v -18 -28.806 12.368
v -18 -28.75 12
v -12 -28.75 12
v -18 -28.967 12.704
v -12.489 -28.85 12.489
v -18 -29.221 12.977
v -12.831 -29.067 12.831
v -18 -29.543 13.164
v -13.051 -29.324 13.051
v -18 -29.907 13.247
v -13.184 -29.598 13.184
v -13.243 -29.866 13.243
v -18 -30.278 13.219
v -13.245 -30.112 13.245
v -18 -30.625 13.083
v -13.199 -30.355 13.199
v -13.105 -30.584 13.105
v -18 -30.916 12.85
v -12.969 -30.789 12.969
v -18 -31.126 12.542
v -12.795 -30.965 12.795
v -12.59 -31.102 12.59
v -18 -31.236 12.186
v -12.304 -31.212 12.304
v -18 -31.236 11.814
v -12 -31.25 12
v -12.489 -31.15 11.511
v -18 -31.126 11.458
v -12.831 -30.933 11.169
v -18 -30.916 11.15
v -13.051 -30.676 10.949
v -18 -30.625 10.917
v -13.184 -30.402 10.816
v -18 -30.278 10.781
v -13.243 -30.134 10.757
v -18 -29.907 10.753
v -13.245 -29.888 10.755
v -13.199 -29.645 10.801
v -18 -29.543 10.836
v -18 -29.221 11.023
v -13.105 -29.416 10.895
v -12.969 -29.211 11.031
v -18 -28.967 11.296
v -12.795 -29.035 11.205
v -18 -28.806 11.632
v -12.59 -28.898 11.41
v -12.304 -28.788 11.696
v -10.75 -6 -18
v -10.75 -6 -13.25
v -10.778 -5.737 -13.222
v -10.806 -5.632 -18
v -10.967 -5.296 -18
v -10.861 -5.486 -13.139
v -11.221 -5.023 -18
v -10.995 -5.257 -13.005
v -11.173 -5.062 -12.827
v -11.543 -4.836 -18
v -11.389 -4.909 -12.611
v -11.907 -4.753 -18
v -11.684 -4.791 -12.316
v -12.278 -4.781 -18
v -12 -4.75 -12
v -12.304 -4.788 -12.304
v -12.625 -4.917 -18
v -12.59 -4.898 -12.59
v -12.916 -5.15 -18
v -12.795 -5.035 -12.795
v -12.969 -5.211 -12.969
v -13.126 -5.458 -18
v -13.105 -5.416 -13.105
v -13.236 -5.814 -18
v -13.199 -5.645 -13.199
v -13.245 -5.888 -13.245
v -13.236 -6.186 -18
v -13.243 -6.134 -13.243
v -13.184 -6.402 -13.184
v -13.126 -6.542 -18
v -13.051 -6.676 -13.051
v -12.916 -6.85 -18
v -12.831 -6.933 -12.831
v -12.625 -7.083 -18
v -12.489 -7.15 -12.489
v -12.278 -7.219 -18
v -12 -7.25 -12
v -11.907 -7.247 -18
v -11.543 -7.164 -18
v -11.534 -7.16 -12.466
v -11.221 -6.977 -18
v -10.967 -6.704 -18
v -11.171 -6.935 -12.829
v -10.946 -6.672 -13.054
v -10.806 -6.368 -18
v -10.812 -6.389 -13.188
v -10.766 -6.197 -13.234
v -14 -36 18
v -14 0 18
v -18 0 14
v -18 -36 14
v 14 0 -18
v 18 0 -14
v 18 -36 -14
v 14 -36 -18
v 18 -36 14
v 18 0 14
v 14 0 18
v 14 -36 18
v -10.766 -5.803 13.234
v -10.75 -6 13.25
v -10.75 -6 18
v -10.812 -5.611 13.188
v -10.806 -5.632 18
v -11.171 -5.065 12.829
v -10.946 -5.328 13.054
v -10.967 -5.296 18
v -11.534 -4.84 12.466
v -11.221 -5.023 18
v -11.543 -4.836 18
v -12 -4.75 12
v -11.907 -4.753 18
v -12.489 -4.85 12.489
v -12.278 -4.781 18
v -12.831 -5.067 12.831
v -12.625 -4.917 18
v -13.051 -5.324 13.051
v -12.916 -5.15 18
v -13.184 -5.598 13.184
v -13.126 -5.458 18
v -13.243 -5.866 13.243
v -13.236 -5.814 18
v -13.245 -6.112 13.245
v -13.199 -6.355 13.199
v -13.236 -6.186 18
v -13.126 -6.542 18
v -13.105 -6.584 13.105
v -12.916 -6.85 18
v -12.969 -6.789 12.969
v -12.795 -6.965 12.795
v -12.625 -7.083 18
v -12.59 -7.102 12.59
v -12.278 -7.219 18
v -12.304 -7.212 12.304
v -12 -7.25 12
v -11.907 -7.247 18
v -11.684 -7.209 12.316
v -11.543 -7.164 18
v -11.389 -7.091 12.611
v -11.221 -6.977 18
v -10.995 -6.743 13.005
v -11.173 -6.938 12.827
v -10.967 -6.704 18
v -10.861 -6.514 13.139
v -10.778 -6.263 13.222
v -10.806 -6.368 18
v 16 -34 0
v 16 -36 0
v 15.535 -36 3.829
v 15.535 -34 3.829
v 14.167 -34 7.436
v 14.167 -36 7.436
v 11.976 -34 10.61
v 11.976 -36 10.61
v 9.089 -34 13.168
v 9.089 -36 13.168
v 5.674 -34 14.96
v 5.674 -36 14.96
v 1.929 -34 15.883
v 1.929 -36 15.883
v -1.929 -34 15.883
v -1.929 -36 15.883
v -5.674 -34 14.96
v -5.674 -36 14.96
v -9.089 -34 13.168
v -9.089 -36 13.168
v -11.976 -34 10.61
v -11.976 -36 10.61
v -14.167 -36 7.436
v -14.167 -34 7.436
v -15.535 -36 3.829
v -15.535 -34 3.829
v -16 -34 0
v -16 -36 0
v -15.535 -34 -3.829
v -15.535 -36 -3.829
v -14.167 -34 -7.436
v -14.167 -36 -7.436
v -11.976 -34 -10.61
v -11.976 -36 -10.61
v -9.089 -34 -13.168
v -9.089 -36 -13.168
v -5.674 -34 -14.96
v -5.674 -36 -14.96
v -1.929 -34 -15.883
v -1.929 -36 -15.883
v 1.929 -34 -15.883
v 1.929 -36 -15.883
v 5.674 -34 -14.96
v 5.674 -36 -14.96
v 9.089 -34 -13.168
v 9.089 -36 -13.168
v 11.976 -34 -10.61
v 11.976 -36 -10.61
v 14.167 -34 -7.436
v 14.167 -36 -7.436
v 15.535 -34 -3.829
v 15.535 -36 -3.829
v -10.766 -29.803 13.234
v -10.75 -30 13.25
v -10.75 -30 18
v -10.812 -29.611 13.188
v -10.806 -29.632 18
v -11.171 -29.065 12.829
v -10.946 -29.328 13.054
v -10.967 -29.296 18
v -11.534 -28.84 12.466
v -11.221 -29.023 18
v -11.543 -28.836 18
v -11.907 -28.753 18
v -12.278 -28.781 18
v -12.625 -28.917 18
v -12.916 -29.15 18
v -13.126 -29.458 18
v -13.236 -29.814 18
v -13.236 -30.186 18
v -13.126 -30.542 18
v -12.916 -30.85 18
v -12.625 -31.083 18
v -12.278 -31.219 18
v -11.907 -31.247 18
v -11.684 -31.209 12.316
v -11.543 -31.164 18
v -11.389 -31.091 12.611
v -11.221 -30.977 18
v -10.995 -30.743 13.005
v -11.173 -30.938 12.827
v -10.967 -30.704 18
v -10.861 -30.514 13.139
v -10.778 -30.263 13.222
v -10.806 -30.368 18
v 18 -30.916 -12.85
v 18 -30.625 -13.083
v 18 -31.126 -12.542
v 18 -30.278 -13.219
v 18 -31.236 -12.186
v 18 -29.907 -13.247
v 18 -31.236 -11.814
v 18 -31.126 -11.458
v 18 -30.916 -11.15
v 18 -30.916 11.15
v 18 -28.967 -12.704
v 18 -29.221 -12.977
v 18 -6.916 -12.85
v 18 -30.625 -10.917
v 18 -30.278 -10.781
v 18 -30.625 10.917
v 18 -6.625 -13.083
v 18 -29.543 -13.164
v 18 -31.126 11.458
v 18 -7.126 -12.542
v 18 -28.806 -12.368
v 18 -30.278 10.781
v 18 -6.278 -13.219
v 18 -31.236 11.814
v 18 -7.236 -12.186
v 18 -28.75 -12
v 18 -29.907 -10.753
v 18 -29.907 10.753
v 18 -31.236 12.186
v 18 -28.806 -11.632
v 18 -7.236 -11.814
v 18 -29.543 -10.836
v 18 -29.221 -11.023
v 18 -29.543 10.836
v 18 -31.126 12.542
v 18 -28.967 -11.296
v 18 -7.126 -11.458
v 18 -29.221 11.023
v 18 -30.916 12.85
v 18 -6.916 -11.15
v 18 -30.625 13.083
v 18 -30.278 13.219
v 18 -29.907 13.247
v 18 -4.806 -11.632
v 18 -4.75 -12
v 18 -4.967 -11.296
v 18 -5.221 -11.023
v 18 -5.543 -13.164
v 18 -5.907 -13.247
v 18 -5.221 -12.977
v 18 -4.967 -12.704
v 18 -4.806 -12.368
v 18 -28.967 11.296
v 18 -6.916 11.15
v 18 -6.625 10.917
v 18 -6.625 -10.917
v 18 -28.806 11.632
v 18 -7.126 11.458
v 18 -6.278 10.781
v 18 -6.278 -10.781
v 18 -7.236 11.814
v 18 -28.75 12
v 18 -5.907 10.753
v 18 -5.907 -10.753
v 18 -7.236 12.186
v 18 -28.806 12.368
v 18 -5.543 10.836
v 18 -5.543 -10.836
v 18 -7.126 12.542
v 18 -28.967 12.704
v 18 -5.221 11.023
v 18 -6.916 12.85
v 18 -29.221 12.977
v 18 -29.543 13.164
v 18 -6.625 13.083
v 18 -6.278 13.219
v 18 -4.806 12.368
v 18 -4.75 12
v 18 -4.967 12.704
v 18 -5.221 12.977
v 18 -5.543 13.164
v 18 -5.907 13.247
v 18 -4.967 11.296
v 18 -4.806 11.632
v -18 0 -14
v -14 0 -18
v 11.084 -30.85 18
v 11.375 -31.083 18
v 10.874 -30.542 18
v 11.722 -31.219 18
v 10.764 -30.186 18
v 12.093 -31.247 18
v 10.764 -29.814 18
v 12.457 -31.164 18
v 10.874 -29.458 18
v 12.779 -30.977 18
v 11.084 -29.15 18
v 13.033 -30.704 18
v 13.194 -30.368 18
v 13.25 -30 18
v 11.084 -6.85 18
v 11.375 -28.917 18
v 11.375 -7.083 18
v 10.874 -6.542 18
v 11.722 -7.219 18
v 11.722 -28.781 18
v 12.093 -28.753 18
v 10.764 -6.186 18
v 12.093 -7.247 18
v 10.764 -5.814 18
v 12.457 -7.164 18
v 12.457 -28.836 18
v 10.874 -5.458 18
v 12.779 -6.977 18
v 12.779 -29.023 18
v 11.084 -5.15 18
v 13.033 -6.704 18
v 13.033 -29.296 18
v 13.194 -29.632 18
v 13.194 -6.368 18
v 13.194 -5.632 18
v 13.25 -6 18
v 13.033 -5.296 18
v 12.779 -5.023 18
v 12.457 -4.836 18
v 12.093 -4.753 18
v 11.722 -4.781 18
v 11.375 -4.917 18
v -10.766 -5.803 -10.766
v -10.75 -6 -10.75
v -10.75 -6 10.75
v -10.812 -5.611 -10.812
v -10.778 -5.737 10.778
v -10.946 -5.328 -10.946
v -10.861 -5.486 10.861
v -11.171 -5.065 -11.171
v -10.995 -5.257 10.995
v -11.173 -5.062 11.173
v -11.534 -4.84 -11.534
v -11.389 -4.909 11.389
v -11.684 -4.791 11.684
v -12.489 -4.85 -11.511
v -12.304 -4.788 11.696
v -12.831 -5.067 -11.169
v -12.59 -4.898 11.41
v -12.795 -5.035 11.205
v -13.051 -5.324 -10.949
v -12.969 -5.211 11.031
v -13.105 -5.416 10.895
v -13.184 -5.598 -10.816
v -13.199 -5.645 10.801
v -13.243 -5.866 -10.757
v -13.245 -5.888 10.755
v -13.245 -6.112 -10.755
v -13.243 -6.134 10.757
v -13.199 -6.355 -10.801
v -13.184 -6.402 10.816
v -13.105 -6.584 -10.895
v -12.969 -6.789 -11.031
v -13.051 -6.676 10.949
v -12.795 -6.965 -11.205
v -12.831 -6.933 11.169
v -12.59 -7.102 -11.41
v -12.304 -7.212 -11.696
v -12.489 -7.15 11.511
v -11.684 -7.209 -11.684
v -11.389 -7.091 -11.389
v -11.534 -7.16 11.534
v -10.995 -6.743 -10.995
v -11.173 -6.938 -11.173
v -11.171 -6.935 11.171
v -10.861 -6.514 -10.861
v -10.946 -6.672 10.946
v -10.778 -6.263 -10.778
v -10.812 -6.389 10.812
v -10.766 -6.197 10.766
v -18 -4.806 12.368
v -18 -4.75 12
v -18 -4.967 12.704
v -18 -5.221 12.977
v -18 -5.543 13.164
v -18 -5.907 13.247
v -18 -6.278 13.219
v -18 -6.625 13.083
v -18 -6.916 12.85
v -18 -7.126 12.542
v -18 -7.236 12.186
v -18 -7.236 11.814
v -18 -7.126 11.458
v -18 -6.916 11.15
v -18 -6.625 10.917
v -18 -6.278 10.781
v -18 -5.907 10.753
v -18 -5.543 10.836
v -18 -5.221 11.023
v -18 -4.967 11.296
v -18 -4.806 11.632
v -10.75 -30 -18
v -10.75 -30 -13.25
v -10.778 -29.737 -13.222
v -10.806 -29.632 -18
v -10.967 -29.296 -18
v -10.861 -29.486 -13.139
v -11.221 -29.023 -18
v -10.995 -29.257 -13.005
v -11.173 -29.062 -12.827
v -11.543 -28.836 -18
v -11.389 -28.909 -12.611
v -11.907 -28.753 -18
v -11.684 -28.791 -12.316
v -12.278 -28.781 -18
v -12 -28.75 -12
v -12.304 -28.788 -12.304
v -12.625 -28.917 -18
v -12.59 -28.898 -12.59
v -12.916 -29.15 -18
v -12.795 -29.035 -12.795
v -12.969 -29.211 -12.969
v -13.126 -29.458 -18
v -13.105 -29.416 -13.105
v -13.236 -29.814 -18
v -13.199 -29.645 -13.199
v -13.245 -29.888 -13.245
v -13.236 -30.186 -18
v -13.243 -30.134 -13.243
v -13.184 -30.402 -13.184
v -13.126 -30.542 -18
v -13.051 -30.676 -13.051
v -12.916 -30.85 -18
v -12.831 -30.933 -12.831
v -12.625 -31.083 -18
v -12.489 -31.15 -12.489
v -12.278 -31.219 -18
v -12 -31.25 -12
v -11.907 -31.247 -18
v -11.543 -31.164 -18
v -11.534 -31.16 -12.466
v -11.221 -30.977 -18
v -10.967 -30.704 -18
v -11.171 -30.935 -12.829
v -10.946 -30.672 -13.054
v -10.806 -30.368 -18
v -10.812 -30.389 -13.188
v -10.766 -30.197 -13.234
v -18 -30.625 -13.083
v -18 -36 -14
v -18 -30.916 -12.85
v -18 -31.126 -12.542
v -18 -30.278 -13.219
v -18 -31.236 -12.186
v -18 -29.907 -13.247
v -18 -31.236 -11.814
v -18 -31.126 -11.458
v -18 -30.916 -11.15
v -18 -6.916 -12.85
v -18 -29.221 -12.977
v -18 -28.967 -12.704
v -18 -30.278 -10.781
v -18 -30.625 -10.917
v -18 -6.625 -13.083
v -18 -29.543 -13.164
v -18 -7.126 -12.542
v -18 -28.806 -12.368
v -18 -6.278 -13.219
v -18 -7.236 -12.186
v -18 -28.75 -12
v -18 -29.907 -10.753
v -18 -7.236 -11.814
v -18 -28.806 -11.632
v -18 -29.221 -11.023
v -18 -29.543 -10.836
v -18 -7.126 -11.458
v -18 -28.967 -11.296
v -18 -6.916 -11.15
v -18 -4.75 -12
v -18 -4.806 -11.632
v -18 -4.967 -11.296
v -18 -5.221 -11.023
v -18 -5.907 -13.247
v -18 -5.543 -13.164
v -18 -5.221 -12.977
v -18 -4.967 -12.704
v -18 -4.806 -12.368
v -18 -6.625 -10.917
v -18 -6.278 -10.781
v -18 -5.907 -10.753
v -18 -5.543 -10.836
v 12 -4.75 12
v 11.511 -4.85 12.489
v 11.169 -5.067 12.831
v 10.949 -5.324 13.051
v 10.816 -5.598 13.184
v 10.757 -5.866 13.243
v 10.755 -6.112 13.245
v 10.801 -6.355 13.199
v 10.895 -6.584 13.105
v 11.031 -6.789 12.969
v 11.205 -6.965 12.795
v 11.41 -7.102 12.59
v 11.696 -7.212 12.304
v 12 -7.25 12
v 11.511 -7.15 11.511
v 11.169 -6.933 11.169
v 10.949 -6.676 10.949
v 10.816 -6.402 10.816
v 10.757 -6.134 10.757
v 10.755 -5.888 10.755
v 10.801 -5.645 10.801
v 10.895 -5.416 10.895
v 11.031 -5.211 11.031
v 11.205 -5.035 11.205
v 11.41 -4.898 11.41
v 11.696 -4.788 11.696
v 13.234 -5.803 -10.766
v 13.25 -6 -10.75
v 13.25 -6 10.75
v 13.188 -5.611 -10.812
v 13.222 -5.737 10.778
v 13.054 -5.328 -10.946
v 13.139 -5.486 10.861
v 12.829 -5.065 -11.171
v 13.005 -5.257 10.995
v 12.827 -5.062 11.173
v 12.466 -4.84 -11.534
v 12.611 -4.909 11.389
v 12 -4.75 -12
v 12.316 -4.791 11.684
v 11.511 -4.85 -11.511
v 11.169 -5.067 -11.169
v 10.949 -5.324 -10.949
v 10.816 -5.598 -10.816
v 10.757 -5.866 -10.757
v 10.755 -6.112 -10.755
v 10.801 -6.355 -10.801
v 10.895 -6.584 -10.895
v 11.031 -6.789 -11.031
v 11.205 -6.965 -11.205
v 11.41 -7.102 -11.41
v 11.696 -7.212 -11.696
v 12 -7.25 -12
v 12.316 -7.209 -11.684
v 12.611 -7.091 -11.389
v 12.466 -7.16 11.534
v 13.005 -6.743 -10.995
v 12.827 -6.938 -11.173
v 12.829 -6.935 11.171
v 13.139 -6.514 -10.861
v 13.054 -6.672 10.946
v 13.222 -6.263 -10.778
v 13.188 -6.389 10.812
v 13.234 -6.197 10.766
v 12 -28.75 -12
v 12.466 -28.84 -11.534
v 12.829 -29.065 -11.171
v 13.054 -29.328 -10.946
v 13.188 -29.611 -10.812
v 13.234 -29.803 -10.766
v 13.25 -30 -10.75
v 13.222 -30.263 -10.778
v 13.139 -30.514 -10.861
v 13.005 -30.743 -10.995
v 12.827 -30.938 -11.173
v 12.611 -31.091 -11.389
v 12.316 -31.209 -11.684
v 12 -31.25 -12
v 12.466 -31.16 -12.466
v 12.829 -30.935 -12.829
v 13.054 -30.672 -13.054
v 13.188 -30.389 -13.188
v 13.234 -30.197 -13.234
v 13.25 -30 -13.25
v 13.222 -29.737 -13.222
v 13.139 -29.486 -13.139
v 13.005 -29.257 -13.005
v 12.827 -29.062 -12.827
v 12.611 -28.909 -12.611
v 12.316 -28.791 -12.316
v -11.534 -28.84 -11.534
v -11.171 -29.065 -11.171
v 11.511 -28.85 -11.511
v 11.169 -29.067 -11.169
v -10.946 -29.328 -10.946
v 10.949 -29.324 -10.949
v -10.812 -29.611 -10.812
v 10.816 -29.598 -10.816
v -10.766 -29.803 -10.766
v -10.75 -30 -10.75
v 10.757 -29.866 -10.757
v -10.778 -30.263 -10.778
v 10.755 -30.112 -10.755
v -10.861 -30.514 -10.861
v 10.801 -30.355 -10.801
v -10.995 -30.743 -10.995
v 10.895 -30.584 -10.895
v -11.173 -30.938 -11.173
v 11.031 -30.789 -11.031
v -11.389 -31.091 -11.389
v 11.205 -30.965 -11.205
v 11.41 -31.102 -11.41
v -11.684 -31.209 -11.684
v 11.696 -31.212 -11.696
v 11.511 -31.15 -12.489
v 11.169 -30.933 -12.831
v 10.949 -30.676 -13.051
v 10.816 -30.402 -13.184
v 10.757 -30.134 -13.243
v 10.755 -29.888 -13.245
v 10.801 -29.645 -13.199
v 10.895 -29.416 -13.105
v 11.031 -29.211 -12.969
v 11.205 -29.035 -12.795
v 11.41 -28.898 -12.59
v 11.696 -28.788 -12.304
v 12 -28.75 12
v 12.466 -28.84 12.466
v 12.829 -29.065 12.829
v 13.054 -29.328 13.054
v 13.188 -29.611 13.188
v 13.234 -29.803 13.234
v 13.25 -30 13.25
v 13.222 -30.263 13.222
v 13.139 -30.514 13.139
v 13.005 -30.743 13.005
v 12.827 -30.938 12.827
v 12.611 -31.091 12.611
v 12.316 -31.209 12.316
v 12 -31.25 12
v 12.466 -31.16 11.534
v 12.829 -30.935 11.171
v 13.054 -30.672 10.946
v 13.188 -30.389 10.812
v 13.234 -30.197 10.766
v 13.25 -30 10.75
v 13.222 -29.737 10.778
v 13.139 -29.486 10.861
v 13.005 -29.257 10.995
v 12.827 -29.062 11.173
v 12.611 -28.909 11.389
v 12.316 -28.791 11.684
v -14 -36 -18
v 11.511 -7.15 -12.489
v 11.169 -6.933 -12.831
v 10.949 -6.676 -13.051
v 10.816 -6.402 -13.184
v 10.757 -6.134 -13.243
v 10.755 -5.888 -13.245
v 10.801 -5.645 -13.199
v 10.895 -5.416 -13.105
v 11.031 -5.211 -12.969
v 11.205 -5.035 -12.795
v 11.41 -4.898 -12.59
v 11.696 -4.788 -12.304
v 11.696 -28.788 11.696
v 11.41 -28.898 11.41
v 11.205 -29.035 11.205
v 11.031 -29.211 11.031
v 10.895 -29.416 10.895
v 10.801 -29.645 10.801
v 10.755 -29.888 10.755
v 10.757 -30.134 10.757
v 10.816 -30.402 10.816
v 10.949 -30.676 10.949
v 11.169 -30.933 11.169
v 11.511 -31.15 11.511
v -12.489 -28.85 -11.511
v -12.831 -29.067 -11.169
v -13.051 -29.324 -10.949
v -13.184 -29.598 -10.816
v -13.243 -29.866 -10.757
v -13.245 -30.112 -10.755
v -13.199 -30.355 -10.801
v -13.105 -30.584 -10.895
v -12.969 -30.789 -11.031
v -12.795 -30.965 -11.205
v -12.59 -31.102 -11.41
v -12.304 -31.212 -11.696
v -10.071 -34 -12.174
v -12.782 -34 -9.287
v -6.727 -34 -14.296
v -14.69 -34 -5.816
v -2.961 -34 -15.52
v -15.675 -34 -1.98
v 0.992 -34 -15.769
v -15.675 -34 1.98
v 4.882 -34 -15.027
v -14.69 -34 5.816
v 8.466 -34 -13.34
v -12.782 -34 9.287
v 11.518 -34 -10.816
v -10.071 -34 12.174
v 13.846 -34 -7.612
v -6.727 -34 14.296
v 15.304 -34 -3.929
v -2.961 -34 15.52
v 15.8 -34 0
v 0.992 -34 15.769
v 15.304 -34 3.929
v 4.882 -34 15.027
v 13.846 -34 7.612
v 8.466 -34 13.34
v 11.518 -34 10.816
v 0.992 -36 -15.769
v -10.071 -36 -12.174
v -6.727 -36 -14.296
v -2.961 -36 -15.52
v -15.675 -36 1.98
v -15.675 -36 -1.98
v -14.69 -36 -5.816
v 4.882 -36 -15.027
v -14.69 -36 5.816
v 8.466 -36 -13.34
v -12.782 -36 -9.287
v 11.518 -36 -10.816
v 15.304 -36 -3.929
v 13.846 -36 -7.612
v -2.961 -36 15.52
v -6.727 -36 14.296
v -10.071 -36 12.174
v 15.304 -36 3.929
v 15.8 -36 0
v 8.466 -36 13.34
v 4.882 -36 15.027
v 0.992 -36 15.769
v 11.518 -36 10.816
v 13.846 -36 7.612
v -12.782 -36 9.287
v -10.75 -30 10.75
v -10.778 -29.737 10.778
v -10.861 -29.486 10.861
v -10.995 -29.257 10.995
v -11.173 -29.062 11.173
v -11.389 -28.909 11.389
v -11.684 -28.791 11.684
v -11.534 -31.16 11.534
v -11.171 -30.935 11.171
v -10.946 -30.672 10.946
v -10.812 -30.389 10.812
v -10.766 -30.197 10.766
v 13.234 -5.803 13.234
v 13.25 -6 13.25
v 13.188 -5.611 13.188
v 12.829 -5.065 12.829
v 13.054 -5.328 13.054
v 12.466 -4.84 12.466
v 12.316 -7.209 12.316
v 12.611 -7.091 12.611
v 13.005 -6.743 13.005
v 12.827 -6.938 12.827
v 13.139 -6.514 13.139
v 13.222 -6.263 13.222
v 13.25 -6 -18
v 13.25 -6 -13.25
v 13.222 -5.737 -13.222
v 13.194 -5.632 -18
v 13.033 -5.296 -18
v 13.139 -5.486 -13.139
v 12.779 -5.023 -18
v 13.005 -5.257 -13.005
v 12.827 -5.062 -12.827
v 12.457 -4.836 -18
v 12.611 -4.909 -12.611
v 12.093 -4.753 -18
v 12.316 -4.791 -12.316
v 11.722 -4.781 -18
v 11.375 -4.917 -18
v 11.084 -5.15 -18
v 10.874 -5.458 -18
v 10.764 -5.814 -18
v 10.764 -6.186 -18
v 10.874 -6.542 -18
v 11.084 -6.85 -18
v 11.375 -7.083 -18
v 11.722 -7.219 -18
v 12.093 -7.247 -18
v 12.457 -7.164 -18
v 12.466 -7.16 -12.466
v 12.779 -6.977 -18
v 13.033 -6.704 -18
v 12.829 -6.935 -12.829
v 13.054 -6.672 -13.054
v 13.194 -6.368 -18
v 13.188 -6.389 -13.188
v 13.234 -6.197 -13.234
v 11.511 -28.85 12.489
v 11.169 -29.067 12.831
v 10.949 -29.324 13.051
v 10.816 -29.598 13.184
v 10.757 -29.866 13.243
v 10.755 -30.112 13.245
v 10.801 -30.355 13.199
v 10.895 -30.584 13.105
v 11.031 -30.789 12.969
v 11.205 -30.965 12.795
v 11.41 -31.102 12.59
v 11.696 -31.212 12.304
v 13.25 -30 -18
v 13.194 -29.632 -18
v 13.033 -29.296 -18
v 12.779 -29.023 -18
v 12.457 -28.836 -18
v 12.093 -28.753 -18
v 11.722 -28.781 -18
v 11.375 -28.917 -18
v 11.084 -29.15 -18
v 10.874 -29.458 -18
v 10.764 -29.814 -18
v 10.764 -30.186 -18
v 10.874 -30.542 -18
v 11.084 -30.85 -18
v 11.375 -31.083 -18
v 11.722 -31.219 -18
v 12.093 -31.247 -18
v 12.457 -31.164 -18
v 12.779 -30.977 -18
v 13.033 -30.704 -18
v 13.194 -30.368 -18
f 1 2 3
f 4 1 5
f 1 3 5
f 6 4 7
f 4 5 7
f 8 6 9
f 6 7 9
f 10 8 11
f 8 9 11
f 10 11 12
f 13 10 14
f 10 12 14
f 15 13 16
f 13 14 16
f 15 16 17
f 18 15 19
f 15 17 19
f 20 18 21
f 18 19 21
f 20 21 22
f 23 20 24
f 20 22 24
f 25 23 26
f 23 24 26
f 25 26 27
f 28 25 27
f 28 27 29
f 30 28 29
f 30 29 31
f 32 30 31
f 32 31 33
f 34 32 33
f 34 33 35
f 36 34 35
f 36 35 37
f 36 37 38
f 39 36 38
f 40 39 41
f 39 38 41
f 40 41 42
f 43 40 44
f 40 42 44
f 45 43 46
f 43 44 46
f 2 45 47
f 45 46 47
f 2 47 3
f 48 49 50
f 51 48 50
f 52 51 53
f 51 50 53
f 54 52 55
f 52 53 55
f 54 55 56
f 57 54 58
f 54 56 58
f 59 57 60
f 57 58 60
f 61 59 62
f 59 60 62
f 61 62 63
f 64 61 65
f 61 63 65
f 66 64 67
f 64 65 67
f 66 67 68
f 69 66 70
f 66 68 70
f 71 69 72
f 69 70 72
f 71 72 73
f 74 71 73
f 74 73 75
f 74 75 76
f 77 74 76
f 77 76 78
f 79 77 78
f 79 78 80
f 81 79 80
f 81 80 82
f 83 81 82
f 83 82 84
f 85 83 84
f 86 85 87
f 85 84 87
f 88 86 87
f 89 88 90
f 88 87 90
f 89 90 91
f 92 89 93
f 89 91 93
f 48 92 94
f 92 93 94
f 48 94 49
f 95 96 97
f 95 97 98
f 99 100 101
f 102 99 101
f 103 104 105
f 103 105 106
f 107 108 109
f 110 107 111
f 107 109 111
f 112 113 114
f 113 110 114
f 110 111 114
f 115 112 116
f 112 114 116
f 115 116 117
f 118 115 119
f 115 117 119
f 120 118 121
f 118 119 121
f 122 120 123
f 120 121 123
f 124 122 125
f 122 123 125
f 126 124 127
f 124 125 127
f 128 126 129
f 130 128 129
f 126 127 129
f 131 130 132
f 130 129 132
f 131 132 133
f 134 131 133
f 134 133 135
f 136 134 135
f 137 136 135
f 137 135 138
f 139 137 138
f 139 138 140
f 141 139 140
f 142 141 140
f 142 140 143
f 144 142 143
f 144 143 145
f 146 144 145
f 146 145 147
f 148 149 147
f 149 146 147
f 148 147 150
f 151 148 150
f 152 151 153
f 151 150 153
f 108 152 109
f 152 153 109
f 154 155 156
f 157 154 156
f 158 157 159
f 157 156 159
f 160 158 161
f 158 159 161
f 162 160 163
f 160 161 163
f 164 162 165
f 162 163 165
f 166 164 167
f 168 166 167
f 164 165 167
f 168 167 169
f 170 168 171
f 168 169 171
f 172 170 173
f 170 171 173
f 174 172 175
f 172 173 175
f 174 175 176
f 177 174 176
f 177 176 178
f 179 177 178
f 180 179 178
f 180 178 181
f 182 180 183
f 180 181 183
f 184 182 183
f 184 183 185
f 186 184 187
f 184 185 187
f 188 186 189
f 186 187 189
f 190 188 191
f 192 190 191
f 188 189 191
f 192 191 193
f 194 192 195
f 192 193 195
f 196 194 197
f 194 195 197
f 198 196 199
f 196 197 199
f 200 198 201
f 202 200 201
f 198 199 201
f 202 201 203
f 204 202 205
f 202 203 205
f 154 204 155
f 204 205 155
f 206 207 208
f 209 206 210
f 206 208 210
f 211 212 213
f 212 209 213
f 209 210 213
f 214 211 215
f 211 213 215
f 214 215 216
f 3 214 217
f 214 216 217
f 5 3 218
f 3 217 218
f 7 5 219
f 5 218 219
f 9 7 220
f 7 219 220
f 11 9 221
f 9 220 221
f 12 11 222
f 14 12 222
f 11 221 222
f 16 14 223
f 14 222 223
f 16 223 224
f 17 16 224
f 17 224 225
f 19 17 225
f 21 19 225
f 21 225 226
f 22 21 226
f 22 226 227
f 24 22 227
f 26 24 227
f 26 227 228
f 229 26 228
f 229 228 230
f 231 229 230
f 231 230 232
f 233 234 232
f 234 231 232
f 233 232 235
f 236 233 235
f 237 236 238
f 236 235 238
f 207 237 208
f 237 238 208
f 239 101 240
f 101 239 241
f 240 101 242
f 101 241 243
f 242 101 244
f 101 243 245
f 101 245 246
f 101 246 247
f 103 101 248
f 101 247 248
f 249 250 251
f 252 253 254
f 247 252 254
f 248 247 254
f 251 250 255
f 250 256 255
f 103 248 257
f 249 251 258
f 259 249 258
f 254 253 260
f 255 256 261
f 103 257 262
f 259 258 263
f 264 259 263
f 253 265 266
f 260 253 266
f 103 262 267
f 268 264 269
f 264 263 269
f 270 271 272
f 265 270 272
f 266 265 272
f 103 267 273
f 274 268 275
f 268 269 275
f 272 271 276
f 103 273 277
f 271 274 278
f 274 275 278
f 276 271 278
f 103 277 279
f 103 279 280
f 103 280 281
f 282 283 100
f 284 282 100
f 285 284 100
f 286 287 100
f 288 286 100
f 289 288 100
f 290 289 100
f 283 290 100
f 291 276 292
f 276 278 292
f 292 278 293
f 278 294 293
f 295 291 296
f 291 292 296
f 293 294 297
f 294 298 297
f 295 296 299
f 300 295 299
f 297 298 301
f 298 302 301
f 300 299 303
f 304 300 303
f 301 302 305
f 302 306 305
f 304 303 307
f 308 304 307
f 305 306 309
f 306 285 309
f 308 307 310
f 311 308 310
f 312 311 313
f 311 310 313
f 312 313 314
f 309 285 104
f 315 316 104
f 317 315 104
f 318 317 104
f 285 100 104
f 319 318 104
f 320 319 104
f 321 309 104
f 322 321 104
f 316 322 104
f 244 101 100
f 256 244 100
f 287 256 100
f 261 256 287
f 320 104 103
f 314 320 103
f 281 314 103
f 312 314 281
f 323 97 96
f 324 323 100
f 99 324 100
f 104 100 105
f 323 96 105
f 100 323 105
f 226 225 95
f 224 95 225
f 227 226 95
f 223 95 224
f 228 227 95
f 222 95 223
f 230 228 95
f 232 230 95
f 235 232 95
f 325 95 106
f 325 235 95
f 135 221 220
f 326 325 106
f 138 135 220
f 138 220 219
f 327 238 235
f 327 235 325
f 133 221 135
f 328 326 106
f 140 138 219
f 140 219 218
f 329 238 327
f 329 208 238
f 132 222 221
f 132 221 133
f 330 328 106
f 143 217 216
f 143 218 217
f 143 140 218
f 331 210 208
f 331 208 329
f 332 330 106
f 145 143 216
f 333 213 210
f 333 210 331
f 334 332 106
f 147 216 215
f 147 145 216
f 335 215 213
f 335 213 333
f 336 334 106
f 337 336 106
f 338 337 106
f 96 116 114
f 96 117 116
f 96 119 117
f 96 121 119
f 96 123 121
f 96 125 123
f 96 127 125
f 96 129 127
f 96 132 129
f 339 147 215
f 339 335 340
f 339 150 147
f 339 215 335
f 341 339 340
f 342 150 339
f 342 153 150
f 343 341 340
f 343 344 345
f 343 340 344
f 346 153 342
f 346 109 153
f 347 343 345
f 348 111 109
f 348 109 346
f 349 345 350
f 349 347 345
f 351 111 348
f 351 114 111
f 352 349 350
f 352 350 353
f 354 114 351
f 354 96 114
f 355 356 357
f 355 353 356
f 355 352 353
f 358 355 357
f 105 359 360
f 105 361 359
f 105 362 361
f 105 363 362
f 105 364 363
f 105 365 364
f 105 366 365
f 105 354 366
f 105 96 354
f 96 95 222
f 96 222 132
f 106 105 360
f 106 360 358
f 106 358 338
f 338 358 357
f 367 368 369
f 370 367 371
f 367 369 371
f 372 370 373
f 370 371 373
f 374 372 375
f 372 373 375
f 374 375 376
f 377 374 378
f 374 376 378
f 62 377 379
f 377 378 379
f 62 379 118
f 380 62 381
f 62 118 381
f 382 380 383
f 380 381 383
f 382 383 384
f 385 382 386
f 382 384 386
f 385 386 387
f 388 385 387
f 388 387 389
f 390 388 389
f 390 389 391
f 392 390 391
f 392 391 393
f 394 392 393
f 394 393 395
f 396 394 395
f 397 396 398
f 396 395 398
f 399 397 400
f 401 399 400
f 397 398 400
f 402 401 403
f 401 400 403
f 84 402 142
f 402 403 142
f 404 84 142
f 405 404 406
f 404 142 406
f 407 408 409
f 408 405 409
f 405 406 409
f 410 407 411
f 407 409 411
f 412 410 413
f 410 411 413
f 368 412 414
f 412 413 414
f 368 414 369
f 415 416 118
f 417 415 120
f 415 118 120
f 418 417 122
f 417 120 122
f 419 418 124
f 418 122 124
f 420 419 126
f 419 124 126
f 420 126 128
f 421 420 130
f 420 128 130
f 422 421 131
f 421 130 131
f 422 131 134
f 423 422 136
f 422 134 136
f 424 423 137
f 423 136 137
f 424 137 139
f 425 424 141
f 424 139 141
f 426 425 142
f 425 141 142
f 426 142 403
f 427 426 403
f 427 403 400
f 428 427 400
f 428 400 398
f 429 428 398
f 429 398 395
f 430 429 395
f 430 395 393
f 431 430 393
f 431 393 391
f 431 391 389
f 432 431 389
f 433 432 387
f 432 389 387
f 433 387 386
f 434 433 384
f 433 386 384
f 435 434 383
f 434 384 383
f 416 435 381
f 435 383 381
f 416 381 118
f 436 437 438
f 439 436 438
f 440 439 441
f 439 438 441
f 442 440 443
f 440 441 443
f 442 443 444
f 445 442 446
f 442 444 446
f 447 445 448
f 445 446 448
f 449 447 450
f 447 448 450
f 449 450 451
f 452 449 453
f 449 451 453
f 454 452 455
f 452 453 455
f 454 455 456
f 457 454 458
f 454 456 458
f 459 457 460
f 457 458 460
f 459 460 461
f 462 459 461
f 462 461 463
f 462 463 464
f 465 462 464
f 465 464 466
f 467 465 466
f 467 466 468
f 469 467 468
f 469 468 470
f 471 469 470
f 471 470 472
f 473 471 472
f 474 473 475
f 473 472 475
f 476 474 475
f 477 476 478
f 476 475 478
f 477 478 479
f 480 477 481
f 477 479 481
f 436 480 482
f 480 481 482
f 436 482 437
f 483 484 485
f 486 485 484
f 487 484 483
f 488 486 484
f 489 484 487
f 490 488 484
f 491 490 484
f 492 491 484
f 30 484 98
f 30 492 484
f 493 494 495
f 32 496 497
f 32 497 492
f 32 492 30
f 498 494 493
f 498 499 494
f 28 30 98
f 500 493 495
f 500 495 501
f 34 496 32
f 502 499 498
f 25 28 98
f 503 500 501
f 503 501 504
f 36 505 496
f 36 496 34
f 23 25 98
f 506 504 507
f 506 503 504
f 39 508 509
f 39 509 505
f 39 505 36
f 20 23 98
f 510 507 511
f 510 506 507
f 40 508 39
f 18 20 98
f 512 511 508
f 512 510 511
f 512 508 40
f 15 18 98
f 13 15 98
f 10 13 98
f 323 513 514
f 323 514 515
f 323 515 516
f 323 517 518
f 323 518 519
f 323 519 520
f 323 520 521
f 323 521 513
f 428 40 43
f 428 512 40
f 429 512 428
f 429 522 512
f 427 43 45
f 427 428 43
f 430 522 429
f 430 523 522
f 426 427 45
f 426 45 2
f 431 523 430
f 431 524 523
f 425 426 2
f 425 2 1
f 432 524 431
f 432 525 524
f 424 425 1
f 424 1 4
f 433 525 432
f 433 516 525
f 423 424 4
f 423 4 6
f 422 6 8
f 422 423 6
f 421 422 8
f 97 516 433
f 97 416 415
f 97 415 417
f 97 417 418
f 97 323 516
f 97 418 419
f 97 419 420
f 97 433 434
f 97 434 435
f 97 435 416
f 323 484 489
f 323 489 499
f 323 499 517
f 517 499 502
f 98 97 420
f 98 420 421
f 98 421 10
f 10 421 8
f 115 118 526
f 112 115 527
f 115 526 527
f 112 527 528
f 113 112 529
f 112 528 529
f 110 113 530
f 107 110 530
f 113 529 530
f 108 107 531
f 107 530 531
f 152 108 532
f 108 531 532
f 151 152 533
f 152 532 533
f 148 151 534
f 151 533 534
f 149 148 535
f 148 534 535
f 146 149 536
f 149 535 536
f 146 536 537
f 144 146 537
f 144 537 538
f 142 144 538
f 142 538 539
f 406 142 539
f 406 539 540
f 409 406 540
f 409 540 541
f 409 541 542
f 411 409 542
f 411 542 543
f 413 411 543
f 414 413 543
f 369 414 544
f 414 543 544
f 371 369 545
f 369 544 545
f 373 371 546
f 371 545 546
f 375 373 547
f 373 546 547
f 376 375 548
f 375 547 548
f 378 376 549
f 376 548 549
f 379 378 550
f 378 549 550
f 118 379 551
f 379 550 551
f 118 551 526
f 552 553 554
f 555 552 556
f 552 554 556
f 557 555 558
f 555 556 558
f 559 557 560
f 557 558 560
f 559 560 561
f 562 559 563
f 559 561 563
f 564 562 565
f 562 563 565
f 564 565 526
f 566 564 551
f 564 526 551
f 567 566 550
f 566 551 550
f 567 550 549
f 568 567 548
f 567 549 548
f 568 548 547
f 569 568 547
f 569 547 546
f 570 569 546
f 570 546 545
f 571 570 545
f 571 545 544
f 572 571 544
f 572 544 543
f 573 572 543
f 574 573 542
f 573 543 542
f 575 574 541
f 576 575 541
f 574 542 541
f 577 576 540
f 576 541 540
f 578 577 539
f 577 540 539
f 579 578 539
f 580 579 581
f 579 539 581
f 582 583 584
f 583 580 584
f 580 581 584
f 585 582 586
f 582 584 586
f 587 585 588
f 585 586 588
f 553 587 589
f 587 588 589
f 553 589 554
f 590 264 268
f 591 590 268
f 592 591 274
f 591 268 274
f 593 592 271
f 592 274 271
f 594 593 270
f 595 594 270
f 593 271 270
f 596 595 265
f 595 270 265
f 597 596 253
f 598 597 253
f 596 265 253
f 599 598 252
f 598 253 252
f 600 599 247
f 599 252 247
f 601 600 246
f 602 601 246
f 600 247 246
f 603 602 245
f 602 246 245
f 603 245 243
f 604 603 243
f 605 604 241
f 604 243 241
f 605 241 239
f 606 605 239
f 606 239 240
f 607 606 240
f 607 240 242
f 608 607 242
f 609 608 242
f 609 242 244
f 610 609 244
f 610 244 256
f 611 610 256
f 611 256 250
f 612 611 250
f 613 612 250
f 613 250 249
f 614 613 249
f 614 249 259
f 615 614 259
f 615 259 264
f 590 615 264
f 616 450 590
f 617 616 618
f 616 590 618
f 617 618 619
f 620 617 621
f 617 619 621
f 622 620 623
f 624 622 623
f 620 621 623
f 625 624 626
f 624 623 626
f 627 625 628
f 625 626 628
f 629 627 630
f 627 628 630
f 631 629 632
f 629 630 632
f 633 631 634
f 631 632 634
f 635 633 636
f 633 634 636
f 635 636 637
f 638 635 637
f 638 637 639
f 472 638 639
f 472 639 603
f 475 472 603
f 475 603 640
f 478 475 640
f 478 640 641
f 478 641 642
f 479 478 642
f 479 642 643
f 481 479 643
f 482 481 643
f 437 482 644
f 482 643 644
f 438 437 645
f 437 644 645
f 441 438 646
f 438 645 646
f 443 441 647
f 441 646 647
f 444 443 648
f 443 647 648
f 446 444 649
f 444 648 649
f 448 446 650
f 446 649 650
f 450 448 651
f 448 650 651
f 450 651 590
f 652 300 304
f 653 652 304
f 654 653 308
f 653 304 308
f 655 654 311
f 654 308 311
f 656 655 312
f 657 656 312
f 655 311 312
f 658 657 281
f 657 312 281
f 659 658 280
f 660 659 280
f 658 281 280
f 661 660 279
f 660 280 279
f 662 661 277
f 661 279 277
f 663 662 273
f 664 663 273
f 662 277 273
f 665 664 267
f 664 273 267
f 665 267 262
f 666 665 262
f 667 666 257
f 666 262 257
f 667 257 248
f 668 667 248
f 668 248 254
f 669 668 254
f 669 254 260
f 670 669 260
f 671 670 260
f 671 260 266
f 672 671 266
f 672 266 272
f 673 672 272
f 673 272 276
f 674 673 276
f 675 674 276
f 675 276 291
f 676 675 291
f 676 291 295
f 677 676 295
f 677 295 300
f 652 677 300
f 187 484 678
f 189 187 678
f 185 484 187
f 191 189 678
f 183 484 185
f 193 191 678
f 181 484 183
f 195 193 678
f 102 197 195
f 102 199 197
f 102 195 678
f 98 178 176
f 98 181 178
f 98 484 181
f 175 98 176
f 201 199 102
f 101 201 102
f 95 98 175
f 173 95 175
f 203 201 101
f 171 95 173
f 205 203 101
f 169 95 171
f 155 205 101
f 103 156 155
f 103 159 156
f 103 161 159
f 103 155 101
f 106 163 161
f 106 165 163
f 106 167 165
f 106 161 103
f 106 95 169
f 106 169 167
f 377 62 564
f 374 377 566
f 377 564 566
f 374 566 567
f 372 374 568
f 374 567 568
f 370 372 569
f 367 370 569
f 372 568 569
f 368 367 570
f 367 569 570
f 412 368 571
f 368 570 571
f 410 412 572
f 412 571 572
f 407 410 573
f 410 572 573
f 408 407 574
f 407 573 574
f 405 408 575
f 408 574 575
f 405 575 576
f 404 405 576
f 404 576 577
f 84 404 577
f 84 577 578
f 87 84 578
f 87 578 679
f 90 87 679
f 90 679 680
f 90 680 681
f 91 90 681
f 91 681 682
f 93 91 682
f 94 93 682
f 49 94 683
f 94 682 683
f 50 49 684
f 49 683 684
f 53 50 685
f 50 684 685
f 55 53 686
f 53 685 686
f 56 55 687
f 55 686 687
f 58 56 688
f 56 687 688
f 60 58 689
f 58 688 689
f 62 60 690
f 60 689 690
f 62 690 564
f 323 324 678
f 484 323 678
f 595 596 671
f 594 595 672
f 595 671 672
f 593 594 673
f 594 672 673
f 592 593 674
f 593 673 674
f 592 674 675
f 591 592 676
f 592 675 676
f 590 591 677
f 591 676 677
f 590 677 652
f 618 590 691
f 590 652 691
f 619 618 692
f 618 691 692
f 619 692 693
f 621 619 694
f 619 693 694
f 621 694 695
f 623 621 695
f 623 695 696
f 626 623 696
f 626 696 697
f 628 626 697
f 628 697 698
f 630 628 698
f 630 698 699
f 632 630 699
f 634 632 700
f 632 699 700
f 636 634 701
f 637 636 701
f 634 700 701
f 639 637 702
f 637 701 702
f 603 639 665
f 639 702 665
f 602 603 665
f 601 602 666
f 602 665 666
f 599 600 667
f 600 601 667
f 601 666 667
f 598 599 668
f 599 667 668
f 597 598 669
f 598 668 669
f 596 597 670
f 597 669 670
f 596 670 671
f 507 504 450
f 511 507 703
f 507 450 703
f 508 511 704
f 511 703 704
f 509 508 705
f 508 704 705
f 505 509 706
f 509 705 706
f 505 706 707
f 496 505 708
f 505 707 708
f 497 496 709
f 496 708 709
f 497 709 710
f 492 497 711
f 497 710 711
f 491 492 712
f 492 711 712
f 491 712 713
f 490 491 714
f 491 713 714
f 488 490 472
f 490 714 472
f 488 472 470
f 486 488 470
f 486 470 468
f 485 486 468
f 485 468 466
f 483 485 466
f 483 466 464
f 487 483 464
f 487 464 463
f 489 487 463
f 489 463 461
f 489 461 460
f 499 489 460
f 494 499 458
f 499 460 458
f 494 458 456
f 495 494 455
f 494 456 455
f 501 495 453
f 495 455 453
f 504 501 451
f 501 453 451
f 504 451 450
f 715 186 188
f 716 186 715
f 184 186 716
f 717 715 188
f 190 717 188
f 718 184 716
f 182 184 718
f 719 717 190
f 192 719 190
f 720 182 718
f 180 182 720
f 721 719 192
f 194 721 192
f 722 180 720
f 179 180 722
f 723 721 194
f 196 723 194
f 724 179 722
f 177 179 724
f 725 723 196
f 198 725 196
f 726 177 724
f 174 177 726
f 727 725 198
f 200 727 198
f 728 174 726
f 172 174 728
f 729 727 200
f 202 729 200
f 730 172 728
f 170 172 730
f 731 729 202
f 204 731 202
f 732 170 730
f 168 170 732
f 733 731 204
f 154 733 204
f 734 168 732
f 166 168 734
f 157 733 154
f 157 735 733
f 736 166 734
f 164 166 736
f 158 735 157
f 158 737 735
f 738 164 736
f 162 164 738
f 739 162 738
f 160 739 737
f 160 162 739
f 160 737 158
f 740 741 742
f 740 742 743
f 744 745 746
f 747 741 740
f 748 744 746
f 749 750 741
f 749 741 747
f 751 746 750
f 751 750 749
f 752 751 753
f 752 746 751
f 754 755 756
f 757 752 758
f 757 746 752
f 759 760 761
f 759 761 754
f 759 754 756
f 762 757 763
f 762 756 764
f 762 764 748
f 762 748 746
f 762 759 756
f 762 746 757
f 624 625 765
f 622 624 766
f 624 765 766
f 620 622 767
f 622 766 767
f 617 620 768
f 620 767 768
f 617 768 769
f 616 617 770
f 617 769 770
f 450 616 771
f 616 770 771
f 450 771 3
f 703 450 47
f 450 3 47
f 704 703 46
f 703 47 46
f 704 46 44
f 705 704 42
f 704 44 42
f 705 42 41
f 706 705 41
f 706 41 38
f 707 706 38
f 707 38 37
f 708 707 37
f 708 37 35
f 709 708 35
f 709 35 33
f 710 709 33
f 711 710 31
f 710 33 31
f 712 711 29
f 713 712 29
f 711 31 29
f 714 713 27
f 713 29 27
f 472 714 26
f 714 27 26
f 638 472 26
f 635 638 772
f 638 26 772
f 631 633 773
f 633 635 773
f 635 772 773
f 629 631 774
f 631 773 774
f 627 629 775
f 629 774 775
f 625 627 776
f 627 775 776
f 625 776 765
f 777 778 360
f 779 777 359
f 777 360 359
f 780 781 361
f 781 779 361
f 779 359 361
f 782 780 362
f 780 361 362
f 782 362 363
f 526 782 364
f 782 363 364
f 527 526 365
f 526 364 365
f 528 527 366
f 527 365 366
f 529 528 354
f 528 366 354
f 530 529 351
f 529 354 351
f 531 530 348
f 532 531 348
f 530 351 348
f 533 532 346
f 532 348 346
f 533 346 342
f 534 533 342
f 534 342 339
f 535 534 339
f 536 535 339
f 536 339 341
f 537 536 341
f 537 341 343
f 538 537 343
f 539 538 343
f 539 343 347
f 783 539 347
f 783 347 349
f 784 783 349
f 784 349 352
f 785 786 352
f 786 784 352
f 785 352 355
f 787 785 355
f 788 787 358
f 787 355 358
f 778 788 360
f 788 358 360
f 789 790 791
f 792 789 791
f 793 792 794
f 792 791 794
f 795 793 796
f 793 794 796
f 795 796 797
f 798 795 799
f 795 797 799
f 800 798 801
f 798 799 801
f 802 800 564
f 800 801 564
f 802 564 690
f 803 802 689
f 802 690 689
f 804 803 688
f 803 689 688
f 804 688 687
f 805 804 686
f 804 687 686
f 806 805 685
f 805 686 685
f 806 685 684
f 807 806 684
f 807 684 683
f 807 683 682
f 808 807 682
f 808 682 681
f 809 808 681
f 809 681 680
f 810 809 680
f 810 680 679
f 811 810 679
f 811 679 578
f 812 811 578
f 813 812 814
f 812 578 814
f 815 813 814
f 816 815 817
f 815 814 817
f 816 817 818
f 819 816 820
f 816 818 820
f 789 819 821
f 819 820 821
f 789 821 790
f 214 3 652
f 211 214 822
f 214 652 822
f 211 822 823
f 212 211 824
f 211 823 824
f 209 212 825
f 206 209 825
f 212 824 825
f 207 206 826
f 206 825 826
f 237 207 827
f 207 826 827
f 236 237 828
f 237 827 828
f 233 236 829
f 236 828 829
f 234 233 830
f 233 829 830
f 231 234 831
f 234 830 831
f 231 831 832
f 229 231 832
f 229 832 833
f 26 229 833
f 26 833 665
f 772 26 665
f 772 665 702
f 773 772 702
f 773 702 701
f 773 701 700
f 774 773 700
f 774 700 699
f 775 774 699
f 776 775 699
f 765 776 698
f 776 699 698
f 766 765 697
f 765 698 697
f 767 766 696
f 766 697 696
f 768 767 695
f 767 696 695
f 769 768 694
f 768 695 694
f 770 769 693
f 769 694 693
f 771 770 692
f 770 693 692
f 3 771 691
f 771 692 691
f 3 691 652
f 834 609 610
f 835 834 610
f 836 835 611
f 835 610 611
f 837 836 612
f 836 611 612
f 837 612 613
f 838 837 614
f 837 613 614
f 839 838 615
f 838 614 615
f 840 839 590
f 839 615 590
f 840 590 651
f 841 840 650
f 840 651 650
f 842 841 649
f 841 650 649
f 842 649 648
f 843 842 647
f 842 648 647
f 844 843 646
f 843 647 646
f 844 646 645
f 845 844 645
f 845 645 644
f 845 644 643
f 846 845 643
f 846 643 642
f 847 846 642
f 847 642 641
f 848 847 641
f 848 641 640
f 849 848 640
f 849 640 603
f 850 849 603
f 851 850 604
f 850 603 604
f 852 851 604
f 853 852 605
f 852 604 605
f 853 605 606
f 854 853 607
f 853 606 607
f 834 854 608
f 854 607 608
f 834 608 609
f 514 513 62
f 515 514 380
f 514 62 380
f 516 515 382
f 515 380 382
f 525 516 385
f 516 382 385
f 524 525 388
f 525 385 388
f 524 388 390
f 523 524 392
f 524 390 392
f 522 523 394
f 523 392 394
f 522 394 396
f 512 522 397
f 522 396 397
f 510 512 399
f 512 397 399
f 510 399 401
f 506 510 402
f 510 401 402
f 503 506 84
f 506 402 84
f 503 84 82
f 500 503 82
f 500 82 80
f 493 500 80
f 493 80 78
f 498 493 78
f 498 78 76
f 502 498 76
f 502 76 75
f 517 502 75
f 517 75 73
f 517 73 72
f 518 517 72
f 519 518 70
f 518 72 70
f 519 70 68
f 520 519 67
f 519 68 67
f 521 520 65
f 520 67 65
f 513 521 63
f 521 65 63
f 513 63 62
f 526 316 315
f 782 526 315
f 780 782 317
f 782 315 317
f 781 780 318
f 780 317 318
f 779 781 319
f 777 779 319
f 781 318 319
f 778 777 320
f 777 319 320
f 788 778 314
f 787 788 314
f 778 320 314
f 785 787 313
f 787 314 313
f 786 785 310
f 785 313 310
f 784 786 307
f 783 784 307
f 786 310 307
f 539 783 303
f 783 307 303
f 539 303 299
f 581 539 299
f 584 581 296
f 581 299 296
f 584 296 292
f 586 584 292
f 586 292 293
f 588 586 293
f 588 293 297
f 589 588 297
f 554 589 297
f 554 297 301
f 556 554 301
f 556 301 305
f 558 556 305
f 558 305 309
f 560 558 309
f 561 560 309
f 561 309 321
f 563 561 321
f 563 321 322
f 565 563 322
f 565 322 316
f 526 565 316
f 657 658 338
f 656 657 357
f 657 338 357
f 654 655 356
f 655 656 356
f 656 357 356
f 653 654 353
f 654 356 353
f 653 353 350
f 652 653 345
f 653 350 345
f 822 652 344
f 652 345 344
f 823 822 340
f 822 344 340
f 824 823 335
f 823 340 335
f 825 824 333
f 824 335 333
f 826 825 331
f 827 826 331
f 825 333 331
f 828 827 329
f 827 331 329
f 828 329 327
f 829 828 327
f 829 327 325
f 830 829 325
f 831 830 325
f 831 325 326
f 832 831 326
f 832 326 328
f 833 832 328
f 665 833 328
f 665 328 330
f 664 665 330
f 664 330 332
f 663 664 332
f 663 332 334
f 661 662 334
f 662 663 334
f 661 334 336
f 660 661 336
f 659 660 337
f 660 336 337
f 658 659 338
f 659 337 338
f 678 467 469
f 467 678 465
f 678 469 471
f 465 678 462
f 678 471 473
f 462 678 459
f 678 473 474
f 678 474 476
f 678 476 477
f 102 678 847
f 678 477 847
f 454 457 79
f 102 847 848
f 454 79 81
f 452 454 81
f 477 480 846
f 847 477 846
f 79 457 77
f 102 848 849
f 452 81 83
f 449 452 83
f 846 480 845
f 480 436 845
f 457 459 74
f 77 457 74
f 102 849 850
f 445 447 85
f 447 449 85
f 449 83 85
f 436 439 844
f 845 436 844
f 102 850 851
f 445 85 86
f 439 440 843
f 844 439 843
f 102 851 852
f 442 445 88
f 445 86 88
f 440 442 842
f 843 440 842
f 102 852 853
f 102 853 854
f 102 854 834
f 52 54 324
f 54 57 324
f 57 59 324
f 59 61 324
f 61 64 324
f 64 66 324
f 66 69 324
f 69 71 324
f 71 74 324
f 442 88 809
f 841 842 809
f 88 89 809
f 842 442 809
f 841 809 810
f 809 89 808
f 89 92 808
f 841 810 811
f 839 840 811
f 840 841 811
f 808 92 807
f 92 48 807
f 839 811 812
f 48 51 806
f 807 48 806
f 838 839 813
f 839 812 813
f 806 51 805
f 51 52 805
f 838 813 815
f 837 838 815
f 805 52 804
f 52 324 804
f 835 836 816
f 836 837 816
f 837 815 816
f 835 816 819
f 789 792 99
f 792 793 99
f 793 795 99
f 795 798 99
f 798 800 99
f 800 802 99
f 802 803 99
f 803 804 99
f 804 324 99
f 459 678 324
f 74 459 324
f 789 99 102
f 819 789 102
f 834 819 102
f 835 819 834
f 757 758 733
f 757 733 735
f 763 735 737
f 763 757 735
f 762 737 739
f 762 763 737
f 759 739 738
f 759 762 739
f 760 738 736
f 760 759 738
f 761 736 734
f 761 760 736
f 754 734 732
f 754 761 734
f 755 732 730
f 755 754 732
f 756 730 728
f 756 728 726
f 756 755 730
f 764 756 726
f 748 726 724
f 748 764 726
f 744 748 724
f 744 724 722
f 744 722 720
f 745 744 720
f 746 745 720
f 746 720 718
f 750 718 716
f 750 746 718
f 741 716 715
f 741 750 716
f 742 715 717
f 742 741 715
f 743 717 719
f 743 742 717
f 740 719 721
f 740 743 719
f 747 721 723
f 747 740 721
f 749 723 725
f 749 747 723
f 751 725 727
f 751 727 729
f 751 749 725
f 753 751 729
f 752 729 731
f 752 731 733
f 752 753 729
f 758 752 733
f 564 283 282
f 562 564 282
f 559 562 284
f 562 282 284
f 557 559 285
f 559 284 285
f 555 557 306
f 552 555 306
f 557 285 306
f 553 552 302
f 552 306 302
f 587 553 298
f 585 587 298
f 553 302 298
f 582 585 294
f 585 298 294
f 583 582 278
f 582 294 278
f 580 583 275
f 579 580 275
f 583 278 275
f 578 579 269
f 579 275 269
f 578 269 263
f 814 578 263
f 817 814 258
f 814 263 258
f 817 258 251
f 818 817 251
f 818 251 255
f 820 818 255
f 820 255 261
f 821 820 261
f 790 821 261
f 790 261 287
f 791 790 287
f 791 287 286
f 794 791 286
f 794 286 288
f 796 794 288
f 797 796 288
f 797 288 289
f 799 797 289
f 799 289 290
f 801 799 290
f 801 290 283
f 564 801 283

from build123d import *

# Parameters (mm, degrees)
F0_W     = 36
F0_H     = 36
F1_DEPTH = 36
F2_R     = 16
F2_R_2   = 15.8
F3_DEPTH = 2
F4_R     = 1.25
F5_DEPTH = 36.001
F6_R     = 1.25
F7_DEPTH = 36.001
F8_SIZE  = 4


with BuildPart() as f1:
    # F0 (on Front) → F1 (new body)
    with BuildSketch(Plane.XZ):
        Rectangle(F0_W, F0_H)
    extrude(amount=F1_DEPTH)

    # F2 (on face) → F3 (cut)
    with BuildSketch(Plane.XZ.offset(36)):
        Circle(F2_R)
        Circle(F2_R_2, mode=Mode.SUBTRACT)
    extrude(amount=-F3_DEPTH, mode=Mode.SUBTRACT)

    # F4 (on face) → F5 (cut, through all)
    with BuildSketch(Plane.YZ.offset(18)):
        with Locations((-30, 12)):
            Circle(F4_R)
        with Locations((-6, 12)):
            Circle(F4_R)
        with Locations((-6, -12)):
            Circle(F4_R)
        with Locations((-30, -12)):
            Circle(F4_R)
    extrude(amount=-F5_DEPTH, mode=Mode.SUBTRACT)

    # F6 (on face) → F7 (cut, through all)
    with BuildSketch(Plane.XY.offset(18)):
        with Locations((-12, -30)):
            Circle(F6_R)
        with Locations((-12, -6)):
            Circle(F6_R)
        with Locations((12, -6)):
            Circle(F6_R)
        with Locations((12, -30)):
            Circle(F6_R)
    extrude(amount=-F7_DEPTH, mode=Mode.SUBTRACT)

    # F8
    f8_edges = [f1.edges().sort_by_distance(p)[0] for p in [
        (18, -18, 18),
        (-18, -18, 18),
        (18, -18, -18),
        (-18, -18, -18),
    ]]
    chamfer(f8_edges, length=F8_SIZE)


solid = f1.part
